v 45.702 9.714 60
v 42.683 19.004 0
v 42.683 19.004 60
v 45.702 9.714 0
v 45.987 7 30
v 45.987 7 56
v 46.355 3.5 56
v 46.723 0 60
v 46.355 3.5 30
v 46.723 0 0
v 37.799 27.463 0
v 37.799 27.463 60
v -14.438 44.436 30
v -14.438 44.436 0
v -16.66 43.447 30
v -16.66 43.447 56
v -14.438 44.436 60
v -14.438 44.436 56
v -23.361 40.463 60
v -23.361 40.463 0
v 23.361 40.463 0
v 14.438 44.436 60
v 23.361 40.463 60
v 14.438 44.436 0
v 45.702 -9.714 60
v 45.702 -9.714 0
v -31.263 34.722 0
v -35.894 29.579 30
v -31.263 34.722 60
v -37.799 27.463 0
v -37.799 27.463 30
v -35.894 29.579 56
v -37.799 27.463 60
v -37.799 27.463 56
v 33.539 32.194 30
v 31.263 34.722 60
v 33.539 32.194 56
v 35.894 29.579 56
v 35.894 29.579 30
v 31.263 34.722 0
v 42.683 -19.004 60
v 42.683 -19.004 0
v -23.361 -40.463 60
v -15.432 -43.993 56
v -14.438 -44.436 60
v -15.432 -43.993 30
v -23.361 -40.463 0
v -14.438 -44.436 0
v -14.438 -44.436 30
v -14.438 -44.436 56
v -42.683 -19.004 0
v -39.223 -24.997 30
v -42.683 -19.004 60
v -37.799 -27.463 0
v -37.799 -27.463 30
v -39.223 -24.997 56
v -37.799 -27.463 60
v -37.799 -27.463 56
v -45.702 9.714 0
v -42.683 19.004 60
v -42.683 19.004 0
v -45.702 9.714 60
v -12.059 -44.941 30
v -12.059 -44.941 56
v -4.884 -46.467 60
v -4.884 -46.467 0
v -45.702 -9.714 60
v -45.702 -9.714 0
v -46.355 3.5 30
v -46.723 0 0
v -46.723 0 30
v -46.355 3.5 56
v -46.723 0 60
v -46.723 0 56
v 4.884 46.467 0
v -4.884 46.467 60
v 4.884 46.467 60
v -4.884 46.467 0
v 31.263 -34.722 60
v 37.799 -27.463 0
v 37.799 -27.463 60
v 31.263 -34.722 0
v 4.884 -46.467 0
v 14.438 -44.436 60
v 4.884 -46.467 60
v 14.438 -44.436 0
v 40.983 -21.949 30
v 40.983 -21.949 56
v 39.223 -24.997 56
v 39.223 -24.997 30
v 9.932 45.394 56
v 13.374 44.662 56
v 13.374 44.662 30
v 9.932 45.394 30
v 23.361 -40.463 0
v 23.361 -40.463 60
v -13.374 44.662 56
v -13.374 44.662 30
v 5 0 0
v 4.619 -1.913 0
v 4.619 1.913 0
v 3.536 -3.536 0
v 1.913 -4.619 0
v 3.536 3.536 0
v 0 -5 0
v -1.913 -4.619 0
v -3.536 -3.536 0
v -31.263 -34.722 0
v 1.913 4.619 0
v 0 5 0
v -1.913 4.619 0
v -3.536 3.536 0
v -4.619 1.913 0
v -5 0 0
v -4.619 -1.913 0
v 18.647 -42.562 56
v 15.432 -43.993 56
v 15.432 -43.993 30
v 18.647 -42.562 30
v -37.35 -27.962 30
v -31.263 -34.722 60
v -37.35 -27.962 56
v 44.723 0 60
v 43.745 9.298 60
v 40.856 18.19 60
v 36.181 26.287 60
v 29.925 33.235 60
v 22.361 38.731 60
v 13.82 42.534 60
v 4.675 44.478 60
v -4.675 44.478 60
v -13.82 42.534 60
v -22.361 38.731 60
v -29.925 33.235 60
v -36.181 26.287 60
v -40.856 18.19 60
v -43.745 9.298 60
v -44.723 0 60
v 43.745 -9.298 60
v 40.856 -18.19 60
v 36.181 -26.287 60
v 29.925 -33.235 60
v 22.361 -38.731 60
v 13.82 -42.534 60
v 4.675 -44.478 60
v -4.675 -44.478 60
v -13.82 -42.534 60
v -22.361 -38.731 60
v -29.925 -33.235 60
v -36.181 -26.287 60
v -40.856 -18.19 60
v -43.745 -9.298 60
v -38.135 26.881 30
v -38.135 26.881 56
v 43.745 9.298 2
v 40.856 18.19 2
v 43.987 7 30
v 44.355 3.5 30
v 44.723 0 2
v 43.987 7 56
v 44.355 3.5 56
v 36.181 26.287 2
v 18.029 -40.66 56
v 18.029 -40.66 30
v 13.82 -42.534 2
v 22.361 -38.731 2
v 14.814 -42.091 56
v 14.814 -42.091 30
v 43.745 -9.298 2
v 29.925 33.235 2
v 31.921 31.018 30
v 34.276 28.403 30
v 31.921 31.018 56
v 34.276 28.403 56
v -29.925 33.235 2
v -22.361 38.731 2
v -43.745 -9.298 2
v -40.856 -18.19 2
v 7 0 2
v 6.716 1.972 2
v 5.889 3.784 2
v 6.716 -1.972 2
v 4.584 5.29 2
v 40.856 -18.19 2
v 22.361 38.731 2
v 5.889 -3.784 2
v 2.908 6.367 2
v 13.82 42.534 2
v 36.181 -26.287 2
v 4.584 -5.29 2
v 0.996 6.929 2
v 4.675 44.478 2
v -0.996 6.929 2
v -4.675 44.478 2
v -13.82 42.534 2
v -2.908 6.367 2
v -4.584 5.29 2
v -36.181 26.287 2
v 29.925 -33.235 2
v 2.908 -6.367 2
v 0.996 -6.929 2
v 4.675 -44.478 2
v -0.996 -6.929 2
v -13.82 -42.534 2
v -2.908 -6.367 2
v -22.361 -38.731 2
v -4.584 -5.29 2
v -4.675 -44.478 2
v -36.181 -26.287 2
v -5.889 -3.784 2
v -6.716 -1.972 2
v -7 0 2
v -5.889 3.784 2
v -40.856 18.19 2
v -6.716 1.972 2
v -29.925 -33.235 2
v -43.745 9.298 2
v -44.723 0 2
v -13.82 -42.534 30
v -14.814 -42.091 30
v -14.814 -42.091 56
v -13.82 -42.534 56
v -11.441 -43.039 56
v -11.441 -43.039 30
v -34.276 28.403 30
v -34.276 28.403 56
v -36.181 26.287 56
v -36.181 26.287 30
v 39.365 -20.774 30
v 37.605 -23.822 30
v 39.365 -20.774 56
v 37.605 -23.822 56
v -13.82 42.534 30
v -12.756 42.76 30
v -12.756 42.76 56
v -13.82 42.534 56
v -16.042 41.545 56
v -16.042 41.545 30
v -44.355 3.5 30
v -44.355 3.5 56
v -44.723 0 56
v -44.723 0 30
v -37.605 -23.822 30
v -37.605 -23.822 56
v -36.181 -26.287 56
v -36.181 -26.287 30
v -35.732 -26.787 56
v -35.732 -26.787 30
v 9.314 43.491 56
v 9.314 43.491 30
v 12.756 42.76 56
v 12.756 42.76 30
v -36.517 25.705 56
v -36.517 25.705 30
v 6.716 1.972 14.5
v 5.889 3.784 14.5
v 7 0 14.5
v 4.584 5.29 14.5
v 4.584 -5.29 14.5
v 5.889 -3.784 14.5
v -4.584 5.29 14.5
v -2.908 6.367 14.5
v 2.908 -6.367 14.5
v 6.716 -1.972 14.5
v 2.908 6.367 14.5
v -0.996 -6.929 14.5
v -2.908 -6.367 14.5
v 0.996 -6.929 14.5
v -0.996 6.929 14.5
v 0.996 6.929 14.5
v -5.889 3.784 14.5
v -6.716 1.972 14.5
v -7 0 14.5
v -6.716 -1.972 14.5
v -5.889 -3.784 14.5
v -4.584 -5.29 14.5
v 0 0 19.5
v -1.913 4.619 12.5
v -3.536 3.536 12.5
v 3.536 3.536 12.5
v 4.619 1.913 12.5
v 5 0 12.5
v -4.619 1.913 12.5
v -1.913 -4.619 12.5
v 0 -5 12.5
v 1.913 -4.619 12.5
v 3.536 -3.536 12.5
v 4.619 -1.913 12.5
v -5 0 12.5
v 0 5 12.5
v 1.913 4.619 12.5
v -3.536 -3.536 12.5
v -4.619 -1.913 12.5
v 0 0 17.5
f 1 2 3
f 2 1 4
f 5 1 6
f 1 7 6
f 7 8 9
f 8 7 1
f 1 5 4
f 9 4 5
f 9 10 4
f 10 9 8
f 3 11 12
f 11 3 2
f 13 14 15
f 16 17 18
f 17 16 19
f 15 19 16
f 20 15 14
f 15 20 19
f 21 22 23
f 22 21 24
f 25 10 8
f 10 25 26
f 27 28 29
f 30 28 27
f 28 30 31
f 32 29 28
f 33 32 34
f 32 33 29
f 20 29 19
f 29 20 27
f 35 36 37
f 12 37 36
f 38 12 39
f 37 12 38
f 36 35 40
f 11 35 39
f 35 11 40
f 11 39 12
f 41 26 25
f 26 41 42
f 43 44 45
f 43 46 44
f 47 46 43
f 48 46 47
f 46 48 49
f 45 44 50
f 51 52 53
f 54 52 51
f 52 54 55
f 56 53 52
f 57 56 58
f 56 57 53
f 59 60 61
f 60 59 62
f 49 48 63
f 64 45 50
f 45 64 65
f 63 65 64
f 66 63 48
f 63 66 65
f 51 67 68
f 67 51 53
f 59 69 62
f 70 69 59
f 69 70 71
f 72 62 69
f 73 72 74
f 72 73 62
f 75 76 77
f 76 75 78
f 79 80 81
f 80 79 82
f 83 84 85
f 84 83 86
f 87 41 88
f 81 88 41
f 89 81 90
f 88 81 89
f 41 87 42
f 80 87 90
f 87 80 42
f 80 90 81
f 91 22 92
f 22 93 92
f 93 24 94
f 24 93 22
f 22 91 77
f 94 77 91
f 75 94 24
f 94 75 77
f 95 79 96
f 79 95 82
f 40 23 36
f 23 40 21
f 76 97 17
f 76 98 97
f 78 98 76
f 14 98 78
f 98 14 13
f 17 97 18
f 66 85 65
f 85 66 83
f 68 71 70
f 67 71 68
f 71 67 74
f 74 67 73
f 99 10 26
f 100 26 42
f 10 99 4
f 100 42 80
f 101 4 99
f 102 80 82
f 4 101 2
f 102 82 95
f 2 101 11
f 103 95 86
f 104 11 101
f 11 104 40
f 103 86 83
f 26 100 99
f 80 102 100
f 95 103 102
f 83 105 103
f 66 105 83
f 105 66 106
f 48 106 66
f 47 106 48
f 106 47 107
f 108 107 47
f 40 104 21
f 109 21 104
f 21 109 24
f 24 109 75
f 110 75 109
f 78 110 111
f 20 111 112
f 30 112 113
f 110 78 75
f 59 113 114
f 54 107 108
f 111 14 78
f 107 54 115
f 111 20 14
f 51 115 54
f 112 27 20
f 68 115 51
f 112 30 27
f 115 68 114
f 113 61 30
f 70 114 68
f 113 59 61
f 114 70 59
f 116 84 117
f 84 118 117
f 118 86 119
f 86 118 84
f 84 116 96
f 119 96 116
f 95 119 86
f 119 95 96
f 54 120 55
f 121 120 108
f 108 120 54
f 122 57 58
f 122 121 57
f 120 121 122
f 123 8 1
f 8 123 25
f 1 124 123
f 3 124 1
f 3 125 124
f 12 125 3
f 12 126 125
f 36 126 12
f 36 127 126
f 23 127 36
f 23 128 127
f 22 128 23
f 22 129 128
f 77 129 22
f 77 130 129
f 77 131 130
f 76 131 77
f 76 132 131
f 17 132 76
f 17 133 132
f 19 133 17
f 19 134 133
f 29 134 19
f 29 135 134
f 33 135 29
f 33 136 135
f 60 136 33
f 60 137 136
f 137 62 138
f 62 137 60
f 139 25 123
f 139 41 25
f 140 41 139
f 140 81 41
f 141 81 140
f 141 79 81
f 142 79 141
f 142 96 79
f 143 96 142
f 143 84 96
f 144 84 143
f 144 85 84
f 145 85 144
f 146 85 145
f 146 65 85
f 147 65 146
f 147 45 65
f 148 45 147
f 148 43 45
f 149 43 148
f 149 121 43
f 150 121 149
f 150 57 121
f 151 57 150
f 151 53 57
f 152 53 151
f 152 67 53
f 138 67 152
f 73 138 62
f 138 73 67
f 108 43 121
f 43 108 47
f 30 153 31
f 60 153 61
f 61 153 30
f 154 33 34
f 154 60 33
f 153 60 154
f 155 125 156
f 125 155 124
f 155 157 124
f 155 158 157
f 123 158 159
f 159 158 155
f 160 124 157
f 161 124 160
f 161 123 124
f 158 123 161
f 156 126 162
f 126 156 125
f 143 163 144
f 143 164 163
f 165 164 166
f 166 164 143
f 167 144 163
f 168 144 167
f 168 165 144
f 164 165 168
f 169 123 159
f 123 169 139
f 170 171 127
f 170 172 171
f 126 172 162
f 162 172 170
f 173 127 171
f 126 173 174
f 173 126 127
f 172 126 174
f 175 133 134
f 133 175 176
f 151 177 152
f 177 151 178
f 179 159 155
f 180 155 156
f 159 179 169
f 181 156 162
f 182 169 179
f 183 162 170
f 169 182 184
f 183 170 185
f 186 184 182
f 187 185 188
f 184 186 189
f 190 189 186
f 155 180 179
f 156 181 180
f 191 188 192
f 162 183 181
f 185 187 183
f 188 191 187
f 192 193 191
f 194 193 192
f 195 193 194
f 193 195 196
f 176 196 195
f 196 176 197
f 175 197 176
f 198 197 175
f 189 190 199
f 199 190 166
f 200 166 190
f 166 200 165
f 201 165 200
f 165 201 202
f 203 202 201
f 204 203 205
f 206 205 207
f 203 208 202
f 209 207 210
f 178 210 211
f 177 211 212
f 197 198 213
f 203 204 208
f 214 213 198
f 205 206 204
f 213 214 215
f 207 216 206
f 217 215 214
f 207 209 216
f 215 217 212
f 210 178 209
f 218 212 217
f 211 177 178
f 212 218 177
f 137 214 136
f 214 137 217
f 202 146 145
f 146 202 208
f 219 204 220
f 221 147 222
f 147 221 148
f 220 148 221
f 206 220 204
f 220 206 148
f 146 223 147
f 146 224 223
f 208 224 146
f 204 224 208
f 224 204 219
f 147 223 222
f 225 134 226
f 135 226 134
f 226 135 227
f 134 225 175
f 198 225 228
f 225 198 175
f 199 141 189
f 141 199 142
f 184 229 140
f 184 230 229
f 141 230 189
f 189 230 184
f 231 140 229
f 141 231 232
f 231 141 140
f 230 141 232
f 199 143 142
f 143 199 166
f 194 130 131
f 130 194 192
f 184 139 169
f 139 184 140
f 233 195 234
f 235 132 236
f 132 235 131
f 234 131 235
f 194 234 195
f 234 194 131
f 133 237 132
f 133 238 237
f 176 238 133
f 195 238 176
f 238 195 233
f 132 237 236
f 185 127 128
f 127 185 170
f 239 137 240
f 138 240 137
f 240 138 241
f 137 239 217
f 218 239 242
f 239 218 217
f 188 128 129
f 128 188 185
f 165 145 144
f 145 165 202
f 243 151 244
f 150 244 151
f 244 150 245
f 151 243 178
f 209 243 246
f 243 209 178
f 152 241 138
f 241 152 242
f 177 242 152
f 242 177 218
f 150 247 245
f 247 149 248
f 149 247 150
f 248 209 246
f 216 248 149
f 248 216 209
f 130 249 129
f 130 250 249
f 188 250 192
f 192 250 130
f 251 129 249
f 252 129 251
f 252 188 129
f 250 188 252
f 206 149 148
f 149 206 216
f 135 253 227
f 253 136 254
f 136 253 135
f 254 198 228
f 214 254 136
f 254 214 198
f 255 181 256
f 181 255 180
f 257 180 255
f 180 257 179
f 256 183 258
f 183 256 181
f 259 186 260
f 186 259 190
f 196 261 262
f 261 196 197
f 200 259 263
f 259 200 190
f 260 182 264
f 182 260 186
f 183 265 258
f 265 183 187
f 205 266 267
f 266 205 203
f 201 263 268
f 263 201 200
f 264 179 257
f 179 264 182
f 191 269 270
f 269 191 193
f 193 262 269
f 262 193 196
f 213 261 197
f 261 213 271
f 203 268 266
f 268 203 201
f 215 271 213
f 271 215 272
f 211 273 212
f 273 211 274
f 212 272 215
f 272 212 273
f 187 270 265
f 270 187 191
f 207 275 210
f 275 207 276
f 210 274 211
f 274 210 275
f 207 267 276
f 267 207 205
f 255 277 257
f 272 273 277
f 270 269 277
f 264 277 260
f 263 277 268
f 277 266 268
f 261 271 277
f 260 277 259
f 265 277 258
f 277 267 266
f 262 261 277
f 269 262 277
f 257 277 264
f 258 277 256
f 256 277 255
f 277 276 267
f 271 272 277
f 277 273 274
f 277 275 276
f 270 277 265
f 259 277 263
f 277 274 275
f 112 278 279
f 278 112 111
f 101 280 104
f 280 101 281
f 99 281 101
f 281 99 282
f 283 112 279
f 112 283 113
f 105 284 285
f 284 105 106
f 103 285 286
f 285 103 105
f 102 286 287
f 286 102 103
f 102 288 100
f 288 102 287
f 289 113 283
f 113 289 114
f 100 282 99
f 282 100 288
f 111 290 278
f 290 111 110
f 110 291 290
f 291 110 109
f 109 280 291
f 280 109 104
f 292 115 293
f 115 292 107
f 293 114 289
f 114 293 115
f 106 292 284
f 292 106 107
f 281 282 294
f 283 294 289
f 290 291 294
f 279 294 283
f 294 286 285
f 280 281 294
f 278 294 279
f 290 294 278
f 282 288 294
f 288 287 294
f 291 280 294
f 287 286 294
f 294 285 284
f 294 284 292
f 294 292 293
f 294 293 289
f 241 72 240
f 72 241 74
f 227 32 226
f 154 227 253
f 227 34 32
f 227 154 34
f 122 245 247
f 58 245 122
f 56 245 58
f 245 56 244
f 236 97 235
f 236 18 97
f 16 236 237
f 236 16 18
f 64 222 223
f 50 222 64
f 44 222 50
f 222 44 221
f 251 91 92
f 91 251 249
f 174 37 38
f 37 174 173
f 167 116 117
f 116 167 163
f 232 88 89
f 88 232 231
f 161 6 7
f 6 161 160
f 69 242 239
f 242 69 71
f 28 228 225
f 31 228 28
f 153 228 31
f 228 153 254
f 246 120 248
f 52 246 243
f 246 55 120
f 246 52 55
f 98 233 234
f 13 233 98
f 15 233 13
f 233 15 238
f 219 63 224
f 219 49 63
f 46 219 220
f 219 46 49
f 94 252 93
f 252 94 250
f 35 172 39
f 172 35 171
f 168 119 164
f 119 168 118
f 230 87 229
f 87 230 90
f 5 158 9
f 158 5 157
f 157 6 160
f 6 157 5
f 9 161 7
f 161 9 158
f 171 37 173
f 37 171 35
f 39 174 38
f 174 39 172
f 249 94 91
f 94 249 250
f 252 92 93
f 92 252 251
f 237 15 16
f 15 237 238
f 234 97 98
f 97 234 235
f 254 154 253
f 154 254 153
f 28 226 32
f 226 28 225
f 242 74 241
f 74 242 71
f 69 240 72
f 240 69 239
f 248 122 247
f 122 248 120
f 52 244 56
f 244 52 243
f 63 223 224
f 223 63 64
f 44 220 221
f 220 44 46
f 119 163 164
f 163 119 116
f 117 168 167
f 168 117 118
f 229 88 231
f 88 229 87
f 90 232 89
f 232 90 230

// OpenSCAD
// Zoetrope animation device by Michael S. Scherotter

// picture strip length in mm
pictureStripLength = 281; //[250:431]

// picture strip height in mm
pictureHeight = 30; // [10:100]

// number of slits
slitCount = 10; // [6:20]

// slit width in mm
slitWidth = 7; // [2:10]

// ignore
coneHeight = 5;

createZoetrope();

module hub(hubHeight)
{
	union()
	{
		cylinder(h= hubHeight - coneHeight, r= 7);
		translate([0,0,hubHeight - coneHeight])
		{
			cylinder(r1=7, r2=0, h=5);
		};
	}
}

module insideHub(pictureHeight) {
    height = pictureHeight - 2;
    innerConeHeight = coneHeight - 1;

    union()
	{
		cylinder(r= 5, h= height - coneHeight);
		translate([0,0,height-coneHeight])
		{
			cylinder(r1= 5, r2= 0, h= coneHeight);
		};
	}
}

module slits(outerRadius, pictureHeight, slitHeight, slitWidth, slitCount) 
{
    arc = 360 / slitCount;
	translate([0,0,pictureHeight])
	{
		union()
		{
			for (a=[0:arc:360])
			{
				translate([0, slitWidth / 2, 0])
				{
					rotate([0,0,a])
					{
						cube([outerRadius * 2, slitWidth / 2, slitHeight]);
					}
				}
			}
		}
	}
}


module createZoetrope () {
	innerRadius = pictureStripLength / (2 * 3.1415927);
    outerRadius = innerRadius + 2;
    slitHeight = pictureHeight;
    hubHeight = pictureHeight *0.65;

    totalHeight = pictureHeight + slitHeight;

	difference()
	{
		union()	
		{
			difference()
			{
				cylinder(r= outerRadius, h= totalHeight );
				translate([0,0,2]){
					cylinder(r= innerRadius, h= totalHeight );
				};
			};
			hub(hubHeight);
		};
		insideHub(hubHeight);
		slits(outerRadius, pictureHeight, slitHeight - 4, slitWidth, slitCount);
	}
}
